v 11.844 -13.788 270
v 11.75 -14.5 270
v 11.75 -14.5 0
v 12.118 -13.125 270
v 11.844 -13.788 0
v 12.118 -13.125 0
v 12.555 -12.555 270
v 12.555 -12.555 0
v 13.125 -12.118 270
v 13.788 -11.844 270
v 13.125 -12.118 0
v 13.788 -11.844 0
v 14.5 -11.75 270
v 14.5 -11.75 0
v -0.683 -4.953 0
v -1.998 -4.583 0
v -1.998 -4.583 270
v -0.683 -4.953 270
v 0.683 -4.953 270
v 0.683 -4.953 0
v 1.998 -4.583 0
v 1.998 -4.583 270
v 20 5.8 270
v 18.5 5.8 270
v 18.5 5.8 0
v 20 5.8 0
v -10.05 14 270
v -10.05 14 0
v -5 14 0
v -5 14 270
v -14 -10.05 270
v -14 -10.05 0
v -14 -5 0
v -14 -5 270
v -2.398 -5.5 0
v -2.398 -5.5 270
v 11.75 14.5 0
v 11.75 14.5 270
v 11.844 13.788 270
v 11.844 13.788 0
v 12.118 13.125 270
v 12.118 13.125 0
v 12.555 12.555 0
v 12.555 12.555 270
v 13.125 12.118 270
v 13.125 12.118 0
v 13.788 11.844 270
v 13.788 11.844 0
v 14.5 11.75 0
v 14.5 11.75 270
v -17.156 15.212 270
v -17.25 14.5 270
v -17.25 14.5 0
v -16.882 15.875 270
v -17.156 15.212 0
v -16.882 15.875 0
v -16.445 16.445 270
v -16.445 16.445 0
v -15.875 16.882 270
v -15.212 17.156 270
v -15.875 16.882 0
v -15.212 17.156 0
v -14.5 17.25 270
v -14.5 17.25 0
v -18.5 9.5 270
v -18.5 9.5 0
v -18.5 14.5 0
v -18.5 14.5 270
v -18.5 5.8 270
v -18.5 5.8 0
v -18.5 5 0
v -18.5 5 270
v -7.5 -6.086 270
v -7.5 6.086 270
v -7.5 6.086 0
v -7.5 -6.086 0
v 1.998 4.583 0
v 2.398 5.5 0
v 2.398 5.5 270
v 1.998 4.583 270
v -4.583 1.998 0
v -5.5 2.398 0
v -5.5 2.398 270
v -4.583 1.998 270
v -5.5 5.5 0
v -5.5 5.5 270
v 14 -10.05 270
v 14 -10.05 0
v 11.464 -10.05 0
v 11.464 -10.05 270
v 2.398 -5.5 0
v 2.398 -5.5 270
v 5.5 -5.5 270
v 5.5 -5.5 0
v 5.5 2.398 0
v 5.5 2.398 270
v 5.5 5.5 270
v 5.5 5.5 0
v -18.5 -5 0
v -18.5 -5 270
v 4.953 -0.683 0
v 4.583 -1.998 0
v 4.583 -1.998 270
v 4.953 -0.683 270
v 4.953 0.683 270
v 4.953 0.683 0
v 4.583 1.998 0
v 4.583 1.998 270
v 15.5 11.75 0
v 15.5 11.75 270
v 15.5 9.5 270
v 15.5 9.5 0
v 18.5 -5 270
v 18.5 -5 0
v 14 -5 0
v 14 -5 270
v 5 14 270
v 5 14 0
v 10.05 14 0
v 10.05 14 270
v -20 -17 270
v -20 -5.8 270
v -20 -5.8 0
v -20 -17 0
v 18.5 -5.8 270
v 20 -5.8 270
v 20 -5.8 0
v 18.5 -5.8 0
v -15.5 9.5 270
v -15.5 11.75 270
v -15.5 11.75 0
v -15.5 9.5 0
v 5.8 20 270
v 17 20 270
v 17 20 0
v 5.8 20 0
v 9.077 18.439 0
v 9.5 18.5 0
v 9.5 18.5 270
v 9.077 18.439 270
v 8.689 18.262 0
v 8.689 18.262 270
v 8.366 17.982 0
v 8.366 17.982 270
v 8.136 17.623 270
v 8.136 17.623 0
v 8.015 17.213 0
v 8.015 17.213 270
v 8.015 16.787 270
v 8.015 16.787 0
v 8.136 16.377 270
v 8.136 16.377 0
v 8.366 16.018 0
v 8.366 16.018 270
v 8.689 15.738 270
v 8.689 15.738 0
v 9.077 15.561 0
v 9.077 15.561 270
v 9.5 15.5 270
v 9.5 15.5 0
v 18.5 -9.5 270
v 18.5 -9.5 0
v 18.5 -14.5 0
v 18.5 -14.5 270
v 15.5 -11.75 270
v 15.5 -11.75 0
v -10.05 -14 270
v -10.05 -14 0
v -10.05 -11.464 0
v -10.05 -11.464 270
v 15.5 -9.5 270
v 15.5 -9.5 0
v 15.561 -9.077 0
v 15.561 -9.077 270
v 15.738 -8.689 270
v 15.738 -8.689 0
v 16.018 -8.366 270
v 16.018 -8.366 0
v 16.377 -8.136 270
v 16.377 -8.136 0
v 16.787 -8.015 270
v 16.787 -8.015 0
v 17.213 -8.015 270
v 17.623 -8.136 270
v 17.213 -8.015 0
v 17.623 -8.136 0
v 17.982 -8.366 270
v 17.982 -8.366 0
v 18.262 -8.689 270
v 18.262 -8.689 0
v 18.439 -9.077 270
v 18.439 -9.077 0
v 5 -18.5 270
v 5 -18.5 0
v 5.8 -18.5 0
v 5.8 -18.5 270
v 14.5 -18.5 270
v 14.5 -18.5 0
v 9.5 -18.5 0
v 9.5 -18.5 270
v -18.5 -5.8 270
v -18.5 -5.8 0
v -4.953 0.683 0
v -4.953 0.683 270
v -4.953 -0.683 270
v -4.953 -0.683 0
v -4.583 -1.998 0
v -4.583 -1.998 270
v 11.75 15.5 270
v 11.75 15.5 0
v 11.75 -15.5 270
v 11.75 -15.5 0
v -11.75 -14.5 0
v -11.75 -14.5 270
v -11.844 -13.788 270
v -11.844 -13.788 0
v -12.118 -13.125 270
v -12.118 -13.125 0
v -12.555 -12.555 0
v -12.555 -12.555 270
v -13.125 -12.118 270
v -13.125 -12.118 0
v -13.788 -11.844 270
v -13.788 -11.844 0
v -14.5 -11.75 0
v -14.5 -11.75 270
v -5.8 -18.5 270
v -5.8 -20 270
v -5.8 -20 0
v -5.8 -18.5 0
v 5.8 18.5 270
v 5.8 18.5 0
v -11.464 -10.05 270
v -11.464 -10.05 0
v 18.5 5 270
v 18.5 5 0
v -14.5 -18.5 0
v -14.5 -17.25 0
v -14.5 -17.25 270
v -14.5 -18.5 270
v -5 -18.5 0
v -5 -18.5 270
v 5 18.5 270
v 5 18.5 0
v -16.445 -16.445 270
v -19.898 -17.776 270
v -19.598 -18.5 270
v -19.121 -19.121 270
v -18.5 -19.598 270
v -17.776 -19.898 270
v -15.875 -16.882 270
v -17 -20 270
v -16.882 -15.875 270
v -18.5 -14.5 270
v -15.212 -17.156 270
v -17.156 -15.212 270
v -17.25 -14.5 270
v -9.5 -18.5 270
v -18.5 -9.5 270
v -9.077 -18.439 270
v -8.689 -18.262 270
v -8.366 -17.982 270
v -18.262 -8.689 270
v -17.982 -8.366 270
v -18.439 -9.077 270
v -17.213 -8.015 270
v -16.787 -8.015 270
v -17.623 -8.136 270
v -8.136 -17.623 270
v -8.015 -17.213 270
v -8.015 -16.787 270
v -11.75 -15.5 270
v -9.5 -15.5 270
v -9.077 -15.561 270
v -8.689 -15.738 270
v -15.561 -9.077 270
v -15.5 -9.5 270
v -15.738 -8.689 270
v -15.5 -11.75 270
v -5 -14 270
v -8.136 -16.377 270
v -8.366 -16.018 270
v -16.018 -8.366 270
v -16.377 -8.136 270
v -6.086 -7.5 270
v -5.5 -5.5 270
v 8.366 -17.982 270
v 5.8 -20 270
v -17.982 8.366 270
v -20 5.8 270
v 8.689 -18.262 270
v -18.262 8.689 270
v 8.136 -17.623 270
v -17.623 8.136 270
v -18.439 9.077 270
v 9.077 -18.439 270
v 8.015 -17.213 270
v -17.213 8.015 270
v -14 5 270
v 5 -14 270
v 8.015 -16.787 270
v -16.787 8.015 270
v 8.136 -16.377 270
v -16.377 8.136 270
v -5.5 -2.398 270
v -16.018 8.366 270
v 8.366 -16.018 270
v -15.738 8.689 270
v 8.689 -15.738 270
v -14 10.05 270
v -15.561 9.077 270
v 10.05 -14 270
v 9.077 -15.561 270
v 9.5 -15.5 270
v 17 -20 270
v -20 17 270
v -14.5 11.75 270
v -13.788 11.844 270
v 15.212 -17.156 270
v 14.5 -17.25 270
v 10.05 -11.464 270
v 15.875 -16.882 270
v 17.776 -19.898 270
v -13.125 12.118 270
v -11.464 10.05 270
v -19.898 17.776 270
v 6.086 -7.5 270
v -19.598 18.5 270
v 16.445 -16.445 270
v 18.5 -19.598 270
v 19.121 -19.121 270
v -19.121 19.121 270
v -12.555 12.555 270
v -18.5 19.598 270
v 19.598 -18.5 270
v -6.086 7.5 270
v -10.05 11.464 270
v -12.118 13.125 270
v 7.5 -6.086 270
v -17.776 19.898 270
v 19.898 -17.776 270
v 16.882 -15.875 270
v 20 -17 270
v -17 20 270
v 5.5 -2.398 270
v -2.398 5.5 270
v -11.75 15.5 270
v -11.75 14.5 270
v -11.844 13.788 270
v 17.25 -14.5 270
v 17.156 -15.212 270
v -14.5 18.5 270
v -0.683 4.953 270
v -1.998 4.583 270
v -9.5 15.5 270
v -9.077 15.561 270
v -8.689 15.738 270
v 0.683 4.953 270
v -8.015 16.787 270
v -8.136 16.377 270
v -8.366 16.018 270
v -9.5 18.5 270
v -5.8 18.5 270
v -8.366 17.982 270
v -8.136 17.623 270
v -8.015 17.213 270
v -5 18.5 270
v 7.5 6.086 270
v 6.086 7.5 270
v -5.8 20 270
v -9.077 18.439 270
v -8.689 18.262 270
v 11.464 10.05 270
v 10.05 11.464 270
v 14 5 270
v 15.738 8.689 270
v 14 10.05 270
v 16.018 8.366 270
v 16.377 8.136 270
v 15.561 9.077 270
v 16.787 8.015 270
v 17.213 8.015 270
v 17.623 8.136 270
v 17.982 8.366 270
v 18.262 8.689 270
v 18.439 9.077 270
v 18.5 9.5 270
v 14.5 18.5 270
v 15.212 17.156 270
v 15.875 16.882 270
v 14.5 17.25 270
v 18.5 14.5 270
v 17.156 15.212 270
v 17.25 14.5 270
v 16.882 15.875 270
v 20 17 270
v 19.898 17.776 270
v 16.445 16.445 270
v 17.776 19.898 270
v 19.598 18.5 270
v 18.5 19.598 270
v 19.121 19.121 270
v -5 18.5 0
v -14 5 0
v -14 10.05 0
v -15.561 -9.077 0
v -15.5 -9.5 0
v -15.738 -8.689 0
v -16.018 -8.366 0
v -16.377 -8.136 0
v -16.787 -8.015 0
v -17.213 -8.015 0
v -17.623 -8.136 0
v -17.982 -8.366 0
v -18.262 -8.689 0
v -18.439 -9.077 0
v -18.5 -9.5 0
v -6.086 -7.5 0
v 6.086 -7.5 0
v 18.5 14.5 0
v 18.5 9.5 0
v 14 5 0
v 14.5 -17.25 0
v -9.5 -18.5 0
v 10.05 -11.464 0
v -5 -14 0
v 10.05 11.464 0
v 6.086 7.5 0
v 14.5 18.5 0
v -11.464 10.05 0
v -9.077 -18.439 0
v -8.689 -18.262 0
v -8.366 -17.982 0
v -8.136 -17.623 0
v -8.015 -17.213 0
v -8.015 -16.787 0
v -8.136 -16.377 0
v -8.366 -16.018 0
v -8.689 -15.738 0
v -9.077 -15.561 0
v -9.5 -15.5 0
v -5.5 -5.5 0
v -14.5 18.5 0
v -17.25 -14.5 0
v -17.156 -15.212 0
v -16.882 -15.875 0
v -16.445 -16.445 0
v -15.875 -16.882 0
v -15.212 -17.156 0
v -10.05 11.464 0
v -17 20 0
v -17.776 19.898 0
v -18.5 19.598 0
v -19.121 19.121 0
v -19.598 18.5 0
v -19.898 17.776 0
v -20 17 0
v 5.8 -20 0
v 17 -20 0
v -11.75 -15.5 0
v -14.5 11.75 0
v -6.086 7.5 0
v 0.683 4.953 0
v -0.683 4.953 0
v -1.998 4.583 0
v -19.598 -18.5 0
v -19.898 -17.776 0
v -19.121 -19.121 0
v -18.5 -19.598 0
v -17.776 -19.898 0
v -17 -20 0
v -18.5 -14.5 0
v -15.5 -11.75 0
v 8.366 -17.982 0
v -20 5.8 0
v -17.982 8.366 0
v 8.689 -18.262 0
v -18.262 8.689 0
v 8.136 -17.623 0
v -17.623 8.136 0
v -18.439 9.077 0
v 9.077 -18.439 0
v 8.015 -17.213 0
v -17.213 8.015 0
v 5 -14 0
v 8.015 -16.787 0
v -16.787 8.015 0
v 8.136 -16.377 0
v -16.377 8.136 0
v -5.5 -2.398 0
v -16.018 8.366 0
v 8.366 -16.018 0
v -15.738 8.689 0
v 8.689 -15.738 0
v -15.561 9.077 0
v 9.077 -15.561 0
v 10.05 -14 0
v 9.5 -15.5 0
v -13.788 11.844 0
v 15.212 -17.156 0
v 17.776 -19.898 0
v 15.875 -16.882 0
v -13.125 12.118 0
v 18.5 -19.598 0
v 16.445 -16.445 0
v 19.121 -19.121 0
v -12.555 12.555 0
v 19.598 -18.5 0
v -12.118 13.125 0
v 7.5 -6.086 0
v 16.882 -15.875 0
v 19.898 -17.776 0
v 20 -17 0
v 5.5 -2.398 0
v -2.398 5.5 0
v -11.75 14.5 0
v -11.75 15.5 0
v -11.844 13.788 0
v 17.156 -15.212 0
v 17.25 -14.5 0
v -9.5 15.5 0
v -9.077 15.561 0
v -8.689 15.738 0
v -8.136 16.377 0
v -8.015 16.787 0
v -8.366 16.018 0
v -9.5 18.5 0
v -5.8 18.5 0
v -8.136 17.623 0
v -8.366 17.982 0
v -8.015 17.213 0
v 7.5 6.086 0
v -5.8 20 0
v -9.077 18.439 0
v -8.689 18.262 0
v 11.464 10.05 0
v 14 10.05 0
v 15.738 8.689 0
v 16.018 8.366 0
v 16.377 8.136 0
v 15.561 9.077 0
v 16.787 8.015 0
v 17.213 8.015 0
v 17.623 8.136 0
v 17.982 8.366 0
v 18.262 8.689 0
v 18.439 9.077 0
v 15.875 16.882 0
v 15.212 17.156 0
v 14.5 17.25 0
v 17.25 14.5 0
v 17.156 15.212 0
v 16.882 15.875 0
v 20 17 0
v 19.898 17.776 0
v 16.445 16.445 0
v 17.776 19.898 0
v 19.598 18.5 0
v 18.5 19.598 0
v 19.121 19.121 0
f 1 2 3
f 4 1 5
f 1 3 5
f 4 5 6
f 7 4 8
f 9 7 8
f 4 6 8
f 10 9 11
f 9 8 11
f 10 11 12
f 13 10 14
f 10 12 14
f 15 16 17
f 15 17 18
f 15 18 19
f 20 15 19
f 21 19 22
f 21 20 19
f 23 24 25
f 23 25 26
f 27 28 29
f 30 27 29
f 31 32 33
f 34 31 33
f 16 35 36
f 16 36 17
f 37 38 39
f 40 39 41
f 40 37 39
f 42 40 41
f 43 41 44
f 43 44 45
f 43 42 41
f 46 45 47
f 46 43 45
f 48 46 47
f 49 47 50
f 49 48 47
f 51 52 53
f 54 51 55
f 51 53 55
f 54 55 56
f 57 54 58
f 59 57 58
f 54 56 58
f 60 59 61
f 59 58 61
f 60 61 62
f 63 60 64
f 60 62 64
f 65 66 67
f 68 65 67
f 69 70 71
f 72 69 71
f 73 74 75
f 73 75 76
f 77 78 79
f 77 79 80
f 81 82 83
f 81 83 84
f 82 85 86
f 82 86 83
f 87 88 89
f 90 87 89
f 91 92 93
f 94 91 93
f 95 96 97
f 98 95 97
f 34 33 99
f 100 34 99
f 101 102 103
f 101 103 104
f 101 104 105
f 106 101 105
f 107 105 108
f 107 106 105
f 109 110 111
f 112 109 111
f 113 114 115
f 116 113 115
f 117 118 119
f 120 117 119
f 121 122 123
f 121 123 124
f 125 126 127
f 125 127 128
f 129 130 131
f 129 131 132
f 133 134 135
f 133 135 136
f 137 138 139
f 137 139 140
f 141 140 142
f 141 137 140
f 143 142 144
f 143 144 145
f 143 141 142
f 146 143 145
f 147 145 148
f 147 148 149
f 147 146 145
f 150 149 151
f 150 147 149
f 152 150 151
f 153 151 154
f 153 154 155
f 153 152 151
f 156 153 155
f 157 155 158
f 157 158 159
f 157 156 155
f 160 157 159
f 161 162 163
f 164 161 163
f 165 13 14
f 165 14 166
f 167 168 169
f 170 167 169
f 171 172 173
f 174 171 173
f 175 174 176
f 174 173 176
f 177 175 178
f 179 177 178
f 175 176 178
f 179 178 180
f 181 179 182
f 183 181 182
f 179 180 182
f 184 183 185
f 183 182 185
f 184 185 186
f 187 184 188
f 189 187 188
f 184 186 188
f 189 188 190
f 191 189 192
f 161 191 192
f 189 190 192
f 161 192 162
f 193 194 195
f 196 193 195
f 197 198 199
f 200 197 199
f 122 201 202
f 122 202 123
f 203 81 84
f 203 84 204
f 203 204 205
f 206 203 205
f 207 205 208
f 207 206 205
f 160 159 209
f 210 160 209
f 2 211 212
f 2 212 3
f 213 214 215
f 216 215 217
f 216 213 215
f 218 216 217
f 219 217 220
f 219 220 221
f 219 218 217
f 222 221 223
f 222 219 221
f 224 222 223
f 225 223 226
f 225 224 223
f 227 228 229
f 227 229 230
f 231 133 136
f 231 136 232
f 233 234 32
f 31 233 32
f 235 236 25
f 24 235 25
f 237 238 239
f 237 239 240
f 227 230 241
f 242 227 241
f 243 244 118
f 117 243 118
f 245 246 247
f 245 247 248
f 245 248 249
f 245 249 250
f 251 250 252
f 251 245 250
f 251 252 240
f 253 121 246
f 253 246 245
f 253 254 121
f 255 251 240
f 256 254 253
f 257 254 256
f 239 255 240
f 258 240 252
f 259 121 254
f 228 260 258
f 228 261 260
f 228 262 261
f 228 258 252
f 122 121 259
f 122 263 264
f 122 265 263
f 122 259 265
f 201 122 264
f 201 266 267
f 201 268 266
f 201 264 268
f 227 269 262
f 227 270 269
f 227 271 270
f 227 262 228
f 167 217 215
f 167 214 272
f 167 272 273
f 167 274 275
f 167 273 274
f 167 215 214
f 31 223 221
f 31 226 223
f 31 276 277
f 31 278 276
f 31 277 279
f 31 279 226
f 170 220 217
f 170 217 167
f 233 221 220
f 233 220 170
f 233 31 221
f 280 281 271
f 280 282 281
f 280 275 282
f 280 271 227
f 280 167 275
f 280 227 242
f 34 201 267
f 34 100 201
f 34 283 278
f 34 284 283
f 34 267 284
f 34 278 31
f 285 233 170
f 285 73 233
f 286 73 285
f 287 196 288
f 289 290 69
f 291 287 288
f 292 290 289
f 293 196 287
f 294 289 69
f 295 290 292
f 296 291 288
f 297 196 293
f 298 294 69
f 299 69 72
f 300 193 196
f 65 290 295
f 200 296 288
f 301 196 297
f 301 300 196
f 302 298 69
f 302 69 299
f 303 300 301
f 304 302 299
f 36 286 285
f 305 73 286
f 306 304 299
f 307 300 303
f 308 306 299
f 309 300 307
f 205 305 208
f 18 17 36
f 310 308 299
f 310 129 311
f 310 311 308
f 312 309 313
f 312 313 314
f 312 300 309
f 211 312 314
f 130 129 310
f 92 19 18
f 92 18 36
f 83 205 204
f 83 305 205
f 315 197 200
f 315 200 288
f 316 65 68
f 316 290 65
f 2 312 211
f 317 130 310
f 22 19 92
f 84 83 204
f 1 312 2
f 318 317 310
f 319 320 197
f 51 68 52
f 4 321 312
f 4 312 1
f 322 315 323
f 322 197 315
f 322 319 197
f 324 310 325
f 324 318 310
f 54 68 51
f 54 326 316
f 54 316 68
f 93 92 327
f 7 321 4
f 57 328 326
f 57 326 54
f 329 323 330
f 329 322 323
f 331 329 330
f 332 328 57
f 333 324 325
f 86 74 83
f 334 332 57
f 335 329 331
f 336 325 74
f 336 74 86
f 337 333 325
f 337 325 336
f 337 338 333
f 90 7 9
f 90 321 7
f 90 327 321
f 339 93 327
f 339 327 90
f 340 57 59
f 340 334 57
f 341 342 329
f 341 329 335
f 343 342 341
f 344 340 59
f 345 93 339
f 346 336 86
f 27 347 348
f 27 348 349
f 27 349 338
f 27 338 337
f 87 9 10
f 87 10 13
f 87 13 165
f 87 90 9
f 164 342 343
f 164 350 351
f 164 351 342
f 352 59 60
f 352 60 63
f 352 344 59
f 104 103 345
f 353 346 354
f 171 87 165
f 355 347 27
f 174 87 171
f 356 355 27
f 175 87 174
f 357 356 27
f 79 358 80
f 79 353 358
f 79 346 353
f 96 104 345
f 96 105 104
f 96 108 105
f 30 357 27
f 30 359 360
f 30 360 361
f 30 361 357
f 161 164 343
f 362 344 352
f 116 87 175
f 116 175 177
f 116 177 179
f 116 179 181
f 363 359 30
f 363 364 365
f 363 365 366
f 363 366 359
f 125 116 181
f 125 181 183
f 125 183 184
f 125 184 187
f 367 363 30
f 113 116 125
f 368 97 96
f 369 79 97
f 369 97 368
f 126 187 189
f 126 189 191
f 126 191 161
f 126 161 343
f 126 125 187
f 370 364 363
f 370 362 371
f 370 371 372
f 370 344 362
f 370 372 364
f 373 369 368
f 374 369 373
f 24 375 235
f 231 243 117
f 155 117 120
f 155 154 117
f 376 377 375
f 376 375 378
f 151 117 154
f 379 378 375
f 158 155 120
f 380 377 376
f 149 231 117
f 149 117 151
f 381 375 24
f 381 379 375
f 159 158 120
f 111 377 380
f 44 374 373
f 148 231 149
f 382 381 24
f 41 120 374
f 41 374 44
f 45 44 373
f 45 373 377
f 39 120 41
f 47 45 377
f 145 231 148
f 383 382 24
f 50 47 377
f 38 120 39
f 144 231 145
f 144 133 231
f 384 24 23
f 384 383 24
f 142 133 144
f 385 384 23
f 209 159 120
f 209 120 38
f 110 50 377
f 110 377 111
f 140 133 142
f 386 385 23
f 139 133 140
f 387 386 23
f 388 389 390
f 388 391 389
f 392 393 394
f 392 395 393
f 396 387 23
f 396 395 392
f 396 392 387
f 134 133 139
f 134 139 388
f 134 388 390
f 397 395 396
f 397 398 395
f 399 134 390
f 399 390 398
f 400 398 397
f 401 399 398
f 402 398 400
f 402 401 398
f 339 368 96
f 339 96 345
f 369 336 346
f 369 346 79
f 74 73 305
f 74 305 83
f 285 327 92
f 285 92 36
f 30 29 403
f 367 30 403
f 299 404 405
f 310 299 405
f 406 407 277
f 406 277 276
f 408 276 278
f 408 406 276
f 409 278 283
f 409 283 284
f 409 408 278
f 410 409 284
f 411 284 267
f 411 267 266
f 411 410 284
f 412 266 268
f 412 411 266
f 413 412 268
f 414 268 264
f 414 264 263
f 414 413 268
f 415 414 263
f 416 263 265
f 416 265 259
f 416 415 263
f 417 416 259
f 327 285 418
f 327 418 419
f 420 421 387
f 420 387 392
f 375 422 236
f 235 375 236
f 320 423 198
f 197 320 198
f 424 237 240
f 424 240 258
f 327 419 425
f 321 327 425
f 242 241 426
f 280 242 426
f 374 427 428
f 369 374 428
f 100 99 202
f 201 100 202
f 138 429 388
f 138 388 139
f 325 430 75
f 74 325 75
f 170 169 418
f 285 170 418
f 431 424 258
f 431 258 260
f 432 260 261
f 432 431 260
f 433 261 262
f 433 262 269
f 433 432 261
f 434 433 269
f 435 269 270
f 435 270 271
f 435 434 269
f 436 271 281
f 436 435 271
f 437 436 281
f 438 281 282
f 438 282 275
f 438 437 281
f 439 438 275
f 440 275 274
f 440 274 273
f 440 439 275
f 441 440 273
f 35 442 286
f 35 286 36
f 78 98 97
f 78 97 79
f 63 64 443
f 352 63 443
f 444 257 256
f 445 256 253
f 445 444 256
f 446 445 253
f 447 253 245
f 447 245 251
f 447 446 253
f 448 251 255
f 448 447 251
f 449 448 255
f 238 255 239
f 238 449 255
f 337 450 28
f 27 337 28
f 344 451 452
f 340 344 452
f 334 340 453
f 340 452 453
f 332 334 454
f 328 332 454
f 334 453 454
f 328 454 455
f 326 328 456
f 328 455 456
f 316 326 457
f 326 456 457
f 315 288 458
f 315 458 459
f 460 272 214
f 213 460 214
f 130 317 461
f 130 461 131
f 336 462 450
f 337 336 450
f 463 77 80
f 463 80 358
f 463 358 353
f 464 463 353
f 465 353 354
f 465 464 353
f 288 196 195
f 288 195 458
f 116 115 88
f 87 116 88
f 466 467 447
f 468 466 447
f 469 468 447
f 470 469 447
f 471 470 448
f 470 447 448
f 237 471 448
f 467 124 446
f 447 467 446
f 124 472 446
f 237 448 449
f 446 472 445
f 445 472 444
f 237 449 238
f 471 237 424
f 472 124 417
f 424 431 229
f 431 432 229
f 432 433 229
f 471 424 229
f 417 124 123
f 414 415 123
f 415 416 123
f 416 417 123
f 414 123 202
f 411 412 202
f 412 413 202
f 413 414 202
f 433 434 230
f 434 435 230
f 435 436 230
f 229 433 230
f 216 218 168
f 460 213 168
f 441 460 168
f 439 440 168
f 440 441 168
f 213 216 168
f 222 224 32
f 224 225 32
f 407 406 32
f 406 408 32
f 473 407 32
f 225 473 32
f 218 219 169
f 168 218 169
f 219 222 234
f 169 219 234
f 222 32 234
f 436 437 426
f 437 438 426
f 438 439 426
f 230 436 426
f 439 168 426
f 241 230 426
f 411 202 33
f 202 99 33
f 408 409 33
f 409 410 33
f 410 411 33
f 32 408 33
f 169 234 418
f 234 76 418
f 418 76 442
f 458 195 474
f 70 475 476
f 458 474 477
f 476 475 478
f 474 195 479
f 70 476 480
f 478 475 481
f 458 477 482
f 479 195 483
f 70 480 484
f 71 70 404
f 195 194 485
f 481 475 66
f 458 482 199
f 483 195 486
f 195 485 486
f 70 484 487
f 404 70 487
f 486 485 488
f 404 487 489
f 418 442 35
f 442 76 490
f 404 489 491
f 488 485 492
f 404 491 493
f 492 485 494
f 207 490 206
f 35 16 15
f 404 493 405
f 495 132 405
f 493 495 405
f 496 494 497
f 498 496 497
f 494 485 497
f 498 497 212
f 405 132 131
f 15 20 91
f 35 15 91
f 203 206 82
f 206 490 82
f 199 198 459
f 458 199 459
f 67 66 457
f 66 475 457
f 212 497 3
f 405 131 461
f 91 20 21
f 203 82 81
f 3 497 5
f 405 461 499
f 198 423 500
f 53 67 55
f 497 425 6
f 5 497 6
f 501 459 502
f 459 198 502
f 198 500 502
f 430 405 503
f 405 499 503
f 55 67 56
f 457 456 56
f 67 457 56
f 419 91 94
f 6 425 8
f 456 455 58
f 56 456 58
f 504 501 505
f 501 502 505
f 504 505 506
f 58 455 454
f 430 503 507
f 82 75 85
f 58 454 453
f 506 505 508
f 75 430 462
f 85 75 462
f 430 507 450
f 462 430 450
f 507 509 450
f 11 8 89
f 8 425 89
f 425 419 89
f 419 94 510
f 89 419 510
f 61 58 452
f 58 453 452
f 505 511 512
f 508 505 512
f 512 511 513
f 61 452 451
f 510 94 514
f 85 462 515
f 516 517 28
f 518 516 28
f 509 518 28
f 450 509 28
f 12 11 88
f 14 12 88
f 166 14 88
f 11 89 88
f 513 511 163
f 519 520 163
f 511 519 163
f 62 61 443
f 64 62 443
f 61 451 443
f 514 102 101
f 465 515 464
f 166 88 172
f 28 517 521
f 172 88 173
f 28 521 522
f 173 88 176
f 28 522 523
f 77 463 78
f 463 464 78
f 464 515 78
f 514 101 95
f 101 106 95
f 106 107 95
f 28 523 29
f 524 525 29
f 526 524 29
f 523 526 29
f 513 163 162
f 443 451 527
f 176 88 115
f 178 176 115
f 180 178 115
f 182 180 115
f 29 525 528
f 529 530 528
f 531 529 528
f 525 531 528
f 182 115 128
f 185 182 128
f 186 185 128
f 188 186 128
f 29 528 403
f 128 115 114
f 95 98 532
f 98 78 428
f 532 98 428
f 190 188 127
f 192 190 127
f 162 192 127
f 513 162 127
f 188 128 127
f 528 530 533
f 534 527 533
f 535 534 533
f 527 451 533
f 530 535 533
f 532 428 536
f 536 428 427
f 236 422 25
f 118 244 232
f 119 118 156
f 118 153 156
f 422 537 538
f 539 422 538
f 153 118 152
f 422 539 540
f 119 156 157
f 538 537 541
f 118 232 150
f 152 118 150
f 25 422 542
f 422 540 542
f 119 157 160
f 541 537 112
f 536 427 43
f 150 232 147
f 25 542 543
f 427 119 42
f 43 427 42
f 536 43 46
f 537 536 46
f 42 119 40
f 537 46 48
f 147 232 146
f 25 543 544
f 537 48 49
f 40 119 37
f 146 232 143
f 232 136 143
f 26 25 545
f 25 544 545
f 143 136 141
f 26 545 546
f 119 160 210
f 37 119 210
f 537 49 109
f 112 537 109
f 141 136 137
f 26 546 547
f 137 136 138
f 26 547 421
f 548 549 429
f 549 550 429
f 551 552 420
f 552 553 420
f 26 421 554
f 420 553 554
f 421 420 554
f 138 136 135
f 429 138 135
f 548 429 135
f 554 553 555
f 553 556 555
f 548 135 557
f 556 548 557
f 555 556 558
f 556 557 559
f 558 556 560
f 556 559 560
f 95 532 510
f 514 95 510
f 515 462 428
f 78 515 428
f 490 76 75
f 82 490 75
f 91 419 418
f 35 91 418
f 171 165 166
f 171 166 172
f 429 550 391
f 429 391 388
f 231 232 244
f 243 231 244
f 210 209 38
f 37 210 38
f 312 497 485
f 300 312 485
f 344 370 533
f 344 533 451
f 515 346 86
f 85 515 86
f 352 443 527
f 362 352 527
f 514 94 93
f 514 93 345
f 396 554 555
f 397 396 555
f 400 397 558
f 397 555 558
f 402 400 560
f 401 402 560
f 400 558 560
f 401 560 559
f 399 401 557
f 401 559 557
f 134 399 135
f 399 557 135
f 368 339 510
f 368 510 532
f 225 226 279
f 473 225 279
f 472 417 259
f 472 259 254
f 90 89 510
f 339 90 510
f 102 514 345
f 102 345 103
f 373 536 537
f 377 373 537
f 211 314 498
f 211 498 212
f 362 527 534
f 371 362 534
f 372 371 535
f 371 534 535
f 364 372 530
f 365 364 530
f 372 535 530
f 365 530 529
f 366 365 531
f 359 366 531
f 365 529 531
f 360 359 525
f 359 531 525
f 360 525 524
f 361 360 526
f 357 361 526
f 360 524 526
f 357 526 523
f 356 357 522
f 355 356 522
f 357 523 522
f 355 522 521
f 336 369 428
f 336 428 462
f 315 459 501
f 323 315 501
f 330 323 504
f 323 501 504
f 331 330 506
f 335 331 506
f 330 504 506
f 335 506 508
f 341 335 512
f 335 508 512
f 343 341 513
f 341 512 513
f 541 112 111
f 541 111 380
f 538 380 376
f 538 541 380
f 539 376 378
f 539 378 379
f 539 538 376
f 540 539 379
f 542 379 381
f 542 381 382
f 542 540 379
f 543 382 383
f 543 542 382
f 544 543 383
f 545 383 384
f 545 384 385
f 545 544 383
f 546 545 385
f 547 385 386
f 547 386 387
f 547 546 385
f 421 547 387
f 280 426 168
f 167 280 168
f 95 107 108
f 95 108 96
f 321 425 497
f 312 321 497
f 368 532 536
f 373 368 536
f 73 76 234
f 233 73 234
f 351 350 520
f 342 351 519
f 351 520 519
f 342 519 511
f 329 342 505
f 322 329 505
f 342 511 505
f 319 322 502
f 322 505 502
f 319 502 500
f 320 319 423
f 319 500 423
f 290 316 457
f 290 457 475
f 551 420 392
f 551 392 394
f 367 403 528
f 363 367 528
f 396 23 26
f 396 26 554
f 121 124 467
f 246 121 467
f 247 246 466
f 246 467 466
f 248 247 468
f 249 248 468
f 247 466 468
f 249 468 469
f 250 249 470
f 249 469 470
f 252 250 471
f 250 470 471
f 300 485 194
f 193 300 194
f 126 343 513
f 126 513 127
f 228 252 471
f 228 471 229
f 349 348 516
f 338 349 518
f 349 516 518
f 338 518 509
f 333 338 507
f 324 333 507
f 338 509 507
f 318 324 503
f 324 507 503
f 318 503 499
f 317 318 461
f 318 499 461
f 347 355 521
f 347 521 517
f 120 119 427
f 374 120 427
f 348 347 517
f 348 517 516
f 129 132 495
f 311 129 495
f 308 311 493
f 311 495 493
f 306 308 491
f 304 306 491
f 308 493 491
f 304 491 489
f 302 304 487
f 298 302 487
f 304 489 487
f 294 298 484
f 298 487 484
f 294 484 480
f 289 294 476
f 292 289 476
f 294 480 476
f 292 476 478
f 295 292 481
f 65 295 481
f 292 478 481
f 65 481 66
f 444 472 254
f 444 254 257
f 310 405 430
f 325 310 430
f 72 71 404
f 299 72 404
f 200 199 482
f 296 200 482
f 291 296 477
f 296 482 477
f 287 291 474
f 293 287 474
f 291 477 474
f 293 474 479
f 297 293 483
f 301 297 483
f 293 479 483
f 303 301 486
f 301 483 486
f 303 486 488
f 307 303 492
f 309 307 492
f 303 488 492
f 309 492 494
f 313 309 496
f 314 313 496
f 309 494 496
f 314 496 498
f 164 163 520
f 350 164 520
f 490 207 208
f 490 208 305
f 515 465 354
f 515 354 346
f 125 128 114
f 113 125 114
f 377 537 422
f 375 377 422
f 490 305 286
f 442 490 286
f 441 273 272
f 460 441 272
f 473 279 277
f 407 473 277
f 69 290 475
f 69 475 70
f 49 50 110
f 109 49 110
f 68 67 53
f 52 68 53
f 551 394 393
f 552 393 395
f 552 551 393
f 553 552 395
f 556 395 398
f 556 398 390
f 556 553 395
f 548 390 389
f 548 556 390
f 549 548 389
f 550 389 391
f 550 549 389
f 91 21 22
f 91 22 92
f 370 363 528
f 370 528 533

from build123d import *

# Parameters (mm, degrees)
EXTRUDE1_DEPTH = 270


with BuildPart() as part:
    # Sketch1 → Extrude1 (new body)
    with BuildSketch(Plane.XY):
        with BuildLine():
            Line((5.8, -20), (17, -20))
            ThreePointArc((17, -20), (19.121320344, -19.121320344), (20, -17))
            Line((20, -17), (20, -5.8))
            Line((20, -5.8), (18.5, -5.8))
            Line((18.5, -5.8), (18.5, -5))
            Line((18.5, -5), (14, -5))
            Line((14, -5), (14, -10.05))
            Line((14, -10.05), (11.464213562, -10.05))
            Line((11.464213562, -10.05), (7.5, -6.085786438))
            Line((7.5, -6.085786438), (7.5, 6.085786438))
            Line((7.5, 6.085786438), (11.464213562, 10.05))
            Line((11.464213562, 10.05), (14, 10.05))
            Line((14, 10.05), (14, 5))
            Line((14, 5), (18.5, 5))
            Line((18.5, 5), (18.5, 5.8))
            Line((18.5, 5.8), (20, 5.8))
            Line((20, 5.8), (20, 17))
            ThreePointArc((20, 17), (19.121320344, 19.121320344), (17, 20))
            Line((17, 20), (5.8, 20))
            Line((5.8, 20), (5.8, 18.5))
            Line((5.8, 18.5), (5, 18.5))
            Line((5, 18.5), (5, 14))
            Line((5, 14), (10.05, 14))
            Line((10.05, 14), (10.05, 11.464213562))
            Line((10.05, 11.464213562), (6.085786438, 7.5))
            Line((6.085786438, 7.5), (-6.085786438, 7.5))
            Line((-6.085786438, 7.5), (-10.05, 11.464213562))
            Line((-10.05, 11.464213562), (-10.05, 14))
            Line((-10.05, 14), (-5, 14))
            Line((-5, 14), (-5, 18.5))
            Line((-5, 18.5), (-5.8, 18.5))
            Line((-5.8, 18.5), (-5.8, 20))
            Line((-5.8, 20), (-17, 20))
            ThreePointArc((-17, 20), (-19.121320344, 19.121320344), (-20, 17))
            Line((-20, 17), (-20, 5.8))
            Line((-20, 5.8), (-18.5, 5.8))
            Line((-18.5, 5.8), (-18.5, 5))
            Line((-18.5, 5), (-14, 5))
            Line((-14, 5), (-14, 10.05))
            Line((-14, 10.05), (-11.464213562, 10.05))
            Line((-11.464213562, 10.05), (-7.5, 6.085786438))
            Line((-7.5, 6.085786438), (-7.5, -6.085786438))
            Line((-7.5, -6.085786438), (-11.464213562, -10.05))
            Line((-11.464213562, -10.05), (-14, -10.05))
            Line((-14, -10.05), (-14, -5))
            Line((-14, -5), (-18.5, -5))
            Line((-18.5, -5), (-18.5, -5.8))
            Line((-18.5, -5.8), (-20, -5.8))
            Line((-20, -5.8), (-20, -17))
            ThreePointArc((-20, -17), (-19.121320344, -19.121320344), (-17, -20))
            Line((-17, -20), (-5.8, -20))
            Line((-5.8, -20), (-5.8, -18.5))
            Line((-5.8, -18.5), (-5, -18.5))
            Line((-5, -18.5), (-5, -14))
            Line((-5, -14), (-10.05, -14))
            Line((-10.05, -14), (-10.05, -11.464213562))
            Line((-10.05, -11.464213562), (-6.085786438, -7.5))
            Line((-6.085786438, -7.5), (6.085786438, -7.5))
            Line((6.085786438, -7.5), (10.05, -11.464213562))
            Line((10.05, -11.464213562), (10.05, -14))
            Line((10.05, -14), (5, -14))
            Line((5, -14), (5, -18.5))
            Line((5, -18.5), (5.8, -18.5))
            Line((5.8, -18.5), (5.8, -20))
        make_face()
        with BuildLine():
            Line((14.5, -18.5), (9.5, -18.5))
            ThreePointArc((9.5, -18.5), (8, -17), (9.5, -15.5))
            Line((9.5, -15.5), (11.75, -15.5))
            Line((11.75, -15.5), (11.75, -14.5))
            ThreePointArc((11.75, -14.5), (12.555456352, -12.555456352), (14.5, -11.75))
            Line((14.5, -11.75), (15.5, -11.75))
            Line((15.5, -11.75), (15.5, -9.5))
            ThreePointArc((15.5, -9.5), (17, -8), (18.5, -9.5))
            Line((18.5, -9.5), (18.5, -14.5))
            Line((18.5, -14.5), (17.25, -14.5))
            ThreePointArc((17.25, -14.5), (16.444543648, -16.444543648), (14.5, -17.25))
            Line((14.5, -17.25), (14.5, -18.5))
        make_face(mode=Mode.SUBTRACT)
        with BuildLine():
            Line((18.5, 14.5), (17.25, 14.5))
            ThreePointArc((17.25, 14.5), (16.444543648, 16.444543648), (14.5, 17.25))
            Line((14.5, 17.25), (14.5, 18.5))
            Line((14.5, 18.5), (9.5, 18.5))
            ThreePointArc((9.5, 18.5), (8, 17), (9.5, 15.5))
            Line((9.5, 15.5), (11.75, 15.5))
            Line((11.75, 15.5), (11.75, 14.5))
            ThreePointArc((11.75, 14.5), (12.555456352, 12.555456352), (14.5, 11.75))
            Line((14.5, 11.75), (15.5, 11.75))
            Line((15.5, 11.75), (15.5, 9.5))
            ThreePointArc((15.5, 9.5), (17, 8), (18.5, 9.5))
            Line((18.5, 9.5), (18.5, 14.5))
        make_face(mode=Mode.SUBTRACT)
        with BuildLine():
            Line((5.5, 5.5), (2.397915762, 5.5))
            Line((2.397915762, 5.5), (1.998263135, 4.583333333))
            ThreePointArc((1.998263135, 4.583333333), (0, 5), (-1.998263135, 4.583333333))
            Line((-1.998263135, 4.583333333), (-2.397915762, 5.5))
            Line((-2.397915762, 5.5), (-5.5, 5.5))
            Line((-5.5, 5.5), (-5.5, 2.397915762))
            Line((-5.5, 2.397915762), (-4.583333333, 1.998263135))
            ThreePointArc((-4.583333333, 1.998263135), (-5, 0), (-4.583333333, -1.998263135))
            Line((-4.583333333, -1.998263135), (-5.5, -2.397915762))
            Line((-5.5, -2.397915762), (-5.5, -5.5))
            Line((-5.5, -5.5), (-2.397915762, -5.5))
            Line((-2.397915762, -5.5), (-1.998263135, -4.583333333))
            ThreePointArc((-1.998263135, -4.583333333), (0, -5), (1.998263135, -4.583333333))
            Line((1.998263135, -4.583333333), (2.397915762, -5.5))
            Line((2.397915762, -5.5), (5.5, -5.5))
            Line((5.5, -5.5), (5.5, -2.397915762))
            Line((5.5, -2.397915762), (4.583333333, -1.998263135))
            ThreePointArc((4.583333333, -1.998263135), (5, 0), (4.583333333, 1.998263135))
            Line((4.583333333, 1.998263135), (5.5, 2.397915762))
            Line((5.5, 2.397915762), (5.5, 5.5))
        make_face(mode=Mode.SUBTRACT)
        with BuildLine():
            Line((-18.5, -14.5), (-17.25, -14.5))
            ThreePointArc((-17.25, -14.5), (-16.444543648, -16.444543648), (-14.5, -17.25))
            Line((-14.5, -17.25), (-14.5, -18.5))
            Line((-14.5, -18.5), (-9.5, -18.5))
            ThreePointArc((-9.5, -18.5), (-8, -17), (-9.5, -15.5))
            Line((-9.5, -15.5), (-11.75, -15.5))
            Line((-11.75, -15.5), (-11.75, -14.5))
            ThreePointArc((-11.75, -14.5), (-12.555456352, -12.555456352), (-14.5, -11.75))
            Line((-14.5, -11.75), (-15.5, -11.75))
            Line((-15.5, -11.75), (-15.5, -9.5))
            ThreePointArc((-15.5, -9.5), (-17, -8), (-18.5, -9.5))
            Line((-18.5, -9.5), (-18.5, -14.5))
        make_face(mode=Mode.SUBTRACT)
        with BuildLine():
            Line((-14.5, 18.5), (-9.5, 18.5))
            ThreePointArc((-9.5, 18.5), (-8, 17), (-9.5, 15.5))
            Line((-9.5, 15.5), (-11.75, 15.5))
            Line((-11.75, 15.5), (-11.75, 14.5))
            ThreePointArc((-11.75, 14.5), (-12.555456352, 12.555456352), (-14.5, 11.75))
            Line((-14.5, 11.75), (-15.5, 11.75))
            Line((-15.5, 11.75), (-15.5, 9.5))
            ThreePointArc((-15.5, 9.5), (-17, 8), (-18.5, 9.5))
            Line((-18.5, 9.5), (-18.5, 14.5))
            Line((-18.5, 14.5), (-17.25, 14.5))
            ThreePointArc((-17.25, 14.5), (-16.444543648, 16.444543648), (-14.5, 17.25))
            Line((-14.5, 17.25), (-14.5, 18.5))
        make_face(mode=Mode.SUBTRACT)
    extrude(amount=EXTRUDE1_DEPTH)


solid = part.part
